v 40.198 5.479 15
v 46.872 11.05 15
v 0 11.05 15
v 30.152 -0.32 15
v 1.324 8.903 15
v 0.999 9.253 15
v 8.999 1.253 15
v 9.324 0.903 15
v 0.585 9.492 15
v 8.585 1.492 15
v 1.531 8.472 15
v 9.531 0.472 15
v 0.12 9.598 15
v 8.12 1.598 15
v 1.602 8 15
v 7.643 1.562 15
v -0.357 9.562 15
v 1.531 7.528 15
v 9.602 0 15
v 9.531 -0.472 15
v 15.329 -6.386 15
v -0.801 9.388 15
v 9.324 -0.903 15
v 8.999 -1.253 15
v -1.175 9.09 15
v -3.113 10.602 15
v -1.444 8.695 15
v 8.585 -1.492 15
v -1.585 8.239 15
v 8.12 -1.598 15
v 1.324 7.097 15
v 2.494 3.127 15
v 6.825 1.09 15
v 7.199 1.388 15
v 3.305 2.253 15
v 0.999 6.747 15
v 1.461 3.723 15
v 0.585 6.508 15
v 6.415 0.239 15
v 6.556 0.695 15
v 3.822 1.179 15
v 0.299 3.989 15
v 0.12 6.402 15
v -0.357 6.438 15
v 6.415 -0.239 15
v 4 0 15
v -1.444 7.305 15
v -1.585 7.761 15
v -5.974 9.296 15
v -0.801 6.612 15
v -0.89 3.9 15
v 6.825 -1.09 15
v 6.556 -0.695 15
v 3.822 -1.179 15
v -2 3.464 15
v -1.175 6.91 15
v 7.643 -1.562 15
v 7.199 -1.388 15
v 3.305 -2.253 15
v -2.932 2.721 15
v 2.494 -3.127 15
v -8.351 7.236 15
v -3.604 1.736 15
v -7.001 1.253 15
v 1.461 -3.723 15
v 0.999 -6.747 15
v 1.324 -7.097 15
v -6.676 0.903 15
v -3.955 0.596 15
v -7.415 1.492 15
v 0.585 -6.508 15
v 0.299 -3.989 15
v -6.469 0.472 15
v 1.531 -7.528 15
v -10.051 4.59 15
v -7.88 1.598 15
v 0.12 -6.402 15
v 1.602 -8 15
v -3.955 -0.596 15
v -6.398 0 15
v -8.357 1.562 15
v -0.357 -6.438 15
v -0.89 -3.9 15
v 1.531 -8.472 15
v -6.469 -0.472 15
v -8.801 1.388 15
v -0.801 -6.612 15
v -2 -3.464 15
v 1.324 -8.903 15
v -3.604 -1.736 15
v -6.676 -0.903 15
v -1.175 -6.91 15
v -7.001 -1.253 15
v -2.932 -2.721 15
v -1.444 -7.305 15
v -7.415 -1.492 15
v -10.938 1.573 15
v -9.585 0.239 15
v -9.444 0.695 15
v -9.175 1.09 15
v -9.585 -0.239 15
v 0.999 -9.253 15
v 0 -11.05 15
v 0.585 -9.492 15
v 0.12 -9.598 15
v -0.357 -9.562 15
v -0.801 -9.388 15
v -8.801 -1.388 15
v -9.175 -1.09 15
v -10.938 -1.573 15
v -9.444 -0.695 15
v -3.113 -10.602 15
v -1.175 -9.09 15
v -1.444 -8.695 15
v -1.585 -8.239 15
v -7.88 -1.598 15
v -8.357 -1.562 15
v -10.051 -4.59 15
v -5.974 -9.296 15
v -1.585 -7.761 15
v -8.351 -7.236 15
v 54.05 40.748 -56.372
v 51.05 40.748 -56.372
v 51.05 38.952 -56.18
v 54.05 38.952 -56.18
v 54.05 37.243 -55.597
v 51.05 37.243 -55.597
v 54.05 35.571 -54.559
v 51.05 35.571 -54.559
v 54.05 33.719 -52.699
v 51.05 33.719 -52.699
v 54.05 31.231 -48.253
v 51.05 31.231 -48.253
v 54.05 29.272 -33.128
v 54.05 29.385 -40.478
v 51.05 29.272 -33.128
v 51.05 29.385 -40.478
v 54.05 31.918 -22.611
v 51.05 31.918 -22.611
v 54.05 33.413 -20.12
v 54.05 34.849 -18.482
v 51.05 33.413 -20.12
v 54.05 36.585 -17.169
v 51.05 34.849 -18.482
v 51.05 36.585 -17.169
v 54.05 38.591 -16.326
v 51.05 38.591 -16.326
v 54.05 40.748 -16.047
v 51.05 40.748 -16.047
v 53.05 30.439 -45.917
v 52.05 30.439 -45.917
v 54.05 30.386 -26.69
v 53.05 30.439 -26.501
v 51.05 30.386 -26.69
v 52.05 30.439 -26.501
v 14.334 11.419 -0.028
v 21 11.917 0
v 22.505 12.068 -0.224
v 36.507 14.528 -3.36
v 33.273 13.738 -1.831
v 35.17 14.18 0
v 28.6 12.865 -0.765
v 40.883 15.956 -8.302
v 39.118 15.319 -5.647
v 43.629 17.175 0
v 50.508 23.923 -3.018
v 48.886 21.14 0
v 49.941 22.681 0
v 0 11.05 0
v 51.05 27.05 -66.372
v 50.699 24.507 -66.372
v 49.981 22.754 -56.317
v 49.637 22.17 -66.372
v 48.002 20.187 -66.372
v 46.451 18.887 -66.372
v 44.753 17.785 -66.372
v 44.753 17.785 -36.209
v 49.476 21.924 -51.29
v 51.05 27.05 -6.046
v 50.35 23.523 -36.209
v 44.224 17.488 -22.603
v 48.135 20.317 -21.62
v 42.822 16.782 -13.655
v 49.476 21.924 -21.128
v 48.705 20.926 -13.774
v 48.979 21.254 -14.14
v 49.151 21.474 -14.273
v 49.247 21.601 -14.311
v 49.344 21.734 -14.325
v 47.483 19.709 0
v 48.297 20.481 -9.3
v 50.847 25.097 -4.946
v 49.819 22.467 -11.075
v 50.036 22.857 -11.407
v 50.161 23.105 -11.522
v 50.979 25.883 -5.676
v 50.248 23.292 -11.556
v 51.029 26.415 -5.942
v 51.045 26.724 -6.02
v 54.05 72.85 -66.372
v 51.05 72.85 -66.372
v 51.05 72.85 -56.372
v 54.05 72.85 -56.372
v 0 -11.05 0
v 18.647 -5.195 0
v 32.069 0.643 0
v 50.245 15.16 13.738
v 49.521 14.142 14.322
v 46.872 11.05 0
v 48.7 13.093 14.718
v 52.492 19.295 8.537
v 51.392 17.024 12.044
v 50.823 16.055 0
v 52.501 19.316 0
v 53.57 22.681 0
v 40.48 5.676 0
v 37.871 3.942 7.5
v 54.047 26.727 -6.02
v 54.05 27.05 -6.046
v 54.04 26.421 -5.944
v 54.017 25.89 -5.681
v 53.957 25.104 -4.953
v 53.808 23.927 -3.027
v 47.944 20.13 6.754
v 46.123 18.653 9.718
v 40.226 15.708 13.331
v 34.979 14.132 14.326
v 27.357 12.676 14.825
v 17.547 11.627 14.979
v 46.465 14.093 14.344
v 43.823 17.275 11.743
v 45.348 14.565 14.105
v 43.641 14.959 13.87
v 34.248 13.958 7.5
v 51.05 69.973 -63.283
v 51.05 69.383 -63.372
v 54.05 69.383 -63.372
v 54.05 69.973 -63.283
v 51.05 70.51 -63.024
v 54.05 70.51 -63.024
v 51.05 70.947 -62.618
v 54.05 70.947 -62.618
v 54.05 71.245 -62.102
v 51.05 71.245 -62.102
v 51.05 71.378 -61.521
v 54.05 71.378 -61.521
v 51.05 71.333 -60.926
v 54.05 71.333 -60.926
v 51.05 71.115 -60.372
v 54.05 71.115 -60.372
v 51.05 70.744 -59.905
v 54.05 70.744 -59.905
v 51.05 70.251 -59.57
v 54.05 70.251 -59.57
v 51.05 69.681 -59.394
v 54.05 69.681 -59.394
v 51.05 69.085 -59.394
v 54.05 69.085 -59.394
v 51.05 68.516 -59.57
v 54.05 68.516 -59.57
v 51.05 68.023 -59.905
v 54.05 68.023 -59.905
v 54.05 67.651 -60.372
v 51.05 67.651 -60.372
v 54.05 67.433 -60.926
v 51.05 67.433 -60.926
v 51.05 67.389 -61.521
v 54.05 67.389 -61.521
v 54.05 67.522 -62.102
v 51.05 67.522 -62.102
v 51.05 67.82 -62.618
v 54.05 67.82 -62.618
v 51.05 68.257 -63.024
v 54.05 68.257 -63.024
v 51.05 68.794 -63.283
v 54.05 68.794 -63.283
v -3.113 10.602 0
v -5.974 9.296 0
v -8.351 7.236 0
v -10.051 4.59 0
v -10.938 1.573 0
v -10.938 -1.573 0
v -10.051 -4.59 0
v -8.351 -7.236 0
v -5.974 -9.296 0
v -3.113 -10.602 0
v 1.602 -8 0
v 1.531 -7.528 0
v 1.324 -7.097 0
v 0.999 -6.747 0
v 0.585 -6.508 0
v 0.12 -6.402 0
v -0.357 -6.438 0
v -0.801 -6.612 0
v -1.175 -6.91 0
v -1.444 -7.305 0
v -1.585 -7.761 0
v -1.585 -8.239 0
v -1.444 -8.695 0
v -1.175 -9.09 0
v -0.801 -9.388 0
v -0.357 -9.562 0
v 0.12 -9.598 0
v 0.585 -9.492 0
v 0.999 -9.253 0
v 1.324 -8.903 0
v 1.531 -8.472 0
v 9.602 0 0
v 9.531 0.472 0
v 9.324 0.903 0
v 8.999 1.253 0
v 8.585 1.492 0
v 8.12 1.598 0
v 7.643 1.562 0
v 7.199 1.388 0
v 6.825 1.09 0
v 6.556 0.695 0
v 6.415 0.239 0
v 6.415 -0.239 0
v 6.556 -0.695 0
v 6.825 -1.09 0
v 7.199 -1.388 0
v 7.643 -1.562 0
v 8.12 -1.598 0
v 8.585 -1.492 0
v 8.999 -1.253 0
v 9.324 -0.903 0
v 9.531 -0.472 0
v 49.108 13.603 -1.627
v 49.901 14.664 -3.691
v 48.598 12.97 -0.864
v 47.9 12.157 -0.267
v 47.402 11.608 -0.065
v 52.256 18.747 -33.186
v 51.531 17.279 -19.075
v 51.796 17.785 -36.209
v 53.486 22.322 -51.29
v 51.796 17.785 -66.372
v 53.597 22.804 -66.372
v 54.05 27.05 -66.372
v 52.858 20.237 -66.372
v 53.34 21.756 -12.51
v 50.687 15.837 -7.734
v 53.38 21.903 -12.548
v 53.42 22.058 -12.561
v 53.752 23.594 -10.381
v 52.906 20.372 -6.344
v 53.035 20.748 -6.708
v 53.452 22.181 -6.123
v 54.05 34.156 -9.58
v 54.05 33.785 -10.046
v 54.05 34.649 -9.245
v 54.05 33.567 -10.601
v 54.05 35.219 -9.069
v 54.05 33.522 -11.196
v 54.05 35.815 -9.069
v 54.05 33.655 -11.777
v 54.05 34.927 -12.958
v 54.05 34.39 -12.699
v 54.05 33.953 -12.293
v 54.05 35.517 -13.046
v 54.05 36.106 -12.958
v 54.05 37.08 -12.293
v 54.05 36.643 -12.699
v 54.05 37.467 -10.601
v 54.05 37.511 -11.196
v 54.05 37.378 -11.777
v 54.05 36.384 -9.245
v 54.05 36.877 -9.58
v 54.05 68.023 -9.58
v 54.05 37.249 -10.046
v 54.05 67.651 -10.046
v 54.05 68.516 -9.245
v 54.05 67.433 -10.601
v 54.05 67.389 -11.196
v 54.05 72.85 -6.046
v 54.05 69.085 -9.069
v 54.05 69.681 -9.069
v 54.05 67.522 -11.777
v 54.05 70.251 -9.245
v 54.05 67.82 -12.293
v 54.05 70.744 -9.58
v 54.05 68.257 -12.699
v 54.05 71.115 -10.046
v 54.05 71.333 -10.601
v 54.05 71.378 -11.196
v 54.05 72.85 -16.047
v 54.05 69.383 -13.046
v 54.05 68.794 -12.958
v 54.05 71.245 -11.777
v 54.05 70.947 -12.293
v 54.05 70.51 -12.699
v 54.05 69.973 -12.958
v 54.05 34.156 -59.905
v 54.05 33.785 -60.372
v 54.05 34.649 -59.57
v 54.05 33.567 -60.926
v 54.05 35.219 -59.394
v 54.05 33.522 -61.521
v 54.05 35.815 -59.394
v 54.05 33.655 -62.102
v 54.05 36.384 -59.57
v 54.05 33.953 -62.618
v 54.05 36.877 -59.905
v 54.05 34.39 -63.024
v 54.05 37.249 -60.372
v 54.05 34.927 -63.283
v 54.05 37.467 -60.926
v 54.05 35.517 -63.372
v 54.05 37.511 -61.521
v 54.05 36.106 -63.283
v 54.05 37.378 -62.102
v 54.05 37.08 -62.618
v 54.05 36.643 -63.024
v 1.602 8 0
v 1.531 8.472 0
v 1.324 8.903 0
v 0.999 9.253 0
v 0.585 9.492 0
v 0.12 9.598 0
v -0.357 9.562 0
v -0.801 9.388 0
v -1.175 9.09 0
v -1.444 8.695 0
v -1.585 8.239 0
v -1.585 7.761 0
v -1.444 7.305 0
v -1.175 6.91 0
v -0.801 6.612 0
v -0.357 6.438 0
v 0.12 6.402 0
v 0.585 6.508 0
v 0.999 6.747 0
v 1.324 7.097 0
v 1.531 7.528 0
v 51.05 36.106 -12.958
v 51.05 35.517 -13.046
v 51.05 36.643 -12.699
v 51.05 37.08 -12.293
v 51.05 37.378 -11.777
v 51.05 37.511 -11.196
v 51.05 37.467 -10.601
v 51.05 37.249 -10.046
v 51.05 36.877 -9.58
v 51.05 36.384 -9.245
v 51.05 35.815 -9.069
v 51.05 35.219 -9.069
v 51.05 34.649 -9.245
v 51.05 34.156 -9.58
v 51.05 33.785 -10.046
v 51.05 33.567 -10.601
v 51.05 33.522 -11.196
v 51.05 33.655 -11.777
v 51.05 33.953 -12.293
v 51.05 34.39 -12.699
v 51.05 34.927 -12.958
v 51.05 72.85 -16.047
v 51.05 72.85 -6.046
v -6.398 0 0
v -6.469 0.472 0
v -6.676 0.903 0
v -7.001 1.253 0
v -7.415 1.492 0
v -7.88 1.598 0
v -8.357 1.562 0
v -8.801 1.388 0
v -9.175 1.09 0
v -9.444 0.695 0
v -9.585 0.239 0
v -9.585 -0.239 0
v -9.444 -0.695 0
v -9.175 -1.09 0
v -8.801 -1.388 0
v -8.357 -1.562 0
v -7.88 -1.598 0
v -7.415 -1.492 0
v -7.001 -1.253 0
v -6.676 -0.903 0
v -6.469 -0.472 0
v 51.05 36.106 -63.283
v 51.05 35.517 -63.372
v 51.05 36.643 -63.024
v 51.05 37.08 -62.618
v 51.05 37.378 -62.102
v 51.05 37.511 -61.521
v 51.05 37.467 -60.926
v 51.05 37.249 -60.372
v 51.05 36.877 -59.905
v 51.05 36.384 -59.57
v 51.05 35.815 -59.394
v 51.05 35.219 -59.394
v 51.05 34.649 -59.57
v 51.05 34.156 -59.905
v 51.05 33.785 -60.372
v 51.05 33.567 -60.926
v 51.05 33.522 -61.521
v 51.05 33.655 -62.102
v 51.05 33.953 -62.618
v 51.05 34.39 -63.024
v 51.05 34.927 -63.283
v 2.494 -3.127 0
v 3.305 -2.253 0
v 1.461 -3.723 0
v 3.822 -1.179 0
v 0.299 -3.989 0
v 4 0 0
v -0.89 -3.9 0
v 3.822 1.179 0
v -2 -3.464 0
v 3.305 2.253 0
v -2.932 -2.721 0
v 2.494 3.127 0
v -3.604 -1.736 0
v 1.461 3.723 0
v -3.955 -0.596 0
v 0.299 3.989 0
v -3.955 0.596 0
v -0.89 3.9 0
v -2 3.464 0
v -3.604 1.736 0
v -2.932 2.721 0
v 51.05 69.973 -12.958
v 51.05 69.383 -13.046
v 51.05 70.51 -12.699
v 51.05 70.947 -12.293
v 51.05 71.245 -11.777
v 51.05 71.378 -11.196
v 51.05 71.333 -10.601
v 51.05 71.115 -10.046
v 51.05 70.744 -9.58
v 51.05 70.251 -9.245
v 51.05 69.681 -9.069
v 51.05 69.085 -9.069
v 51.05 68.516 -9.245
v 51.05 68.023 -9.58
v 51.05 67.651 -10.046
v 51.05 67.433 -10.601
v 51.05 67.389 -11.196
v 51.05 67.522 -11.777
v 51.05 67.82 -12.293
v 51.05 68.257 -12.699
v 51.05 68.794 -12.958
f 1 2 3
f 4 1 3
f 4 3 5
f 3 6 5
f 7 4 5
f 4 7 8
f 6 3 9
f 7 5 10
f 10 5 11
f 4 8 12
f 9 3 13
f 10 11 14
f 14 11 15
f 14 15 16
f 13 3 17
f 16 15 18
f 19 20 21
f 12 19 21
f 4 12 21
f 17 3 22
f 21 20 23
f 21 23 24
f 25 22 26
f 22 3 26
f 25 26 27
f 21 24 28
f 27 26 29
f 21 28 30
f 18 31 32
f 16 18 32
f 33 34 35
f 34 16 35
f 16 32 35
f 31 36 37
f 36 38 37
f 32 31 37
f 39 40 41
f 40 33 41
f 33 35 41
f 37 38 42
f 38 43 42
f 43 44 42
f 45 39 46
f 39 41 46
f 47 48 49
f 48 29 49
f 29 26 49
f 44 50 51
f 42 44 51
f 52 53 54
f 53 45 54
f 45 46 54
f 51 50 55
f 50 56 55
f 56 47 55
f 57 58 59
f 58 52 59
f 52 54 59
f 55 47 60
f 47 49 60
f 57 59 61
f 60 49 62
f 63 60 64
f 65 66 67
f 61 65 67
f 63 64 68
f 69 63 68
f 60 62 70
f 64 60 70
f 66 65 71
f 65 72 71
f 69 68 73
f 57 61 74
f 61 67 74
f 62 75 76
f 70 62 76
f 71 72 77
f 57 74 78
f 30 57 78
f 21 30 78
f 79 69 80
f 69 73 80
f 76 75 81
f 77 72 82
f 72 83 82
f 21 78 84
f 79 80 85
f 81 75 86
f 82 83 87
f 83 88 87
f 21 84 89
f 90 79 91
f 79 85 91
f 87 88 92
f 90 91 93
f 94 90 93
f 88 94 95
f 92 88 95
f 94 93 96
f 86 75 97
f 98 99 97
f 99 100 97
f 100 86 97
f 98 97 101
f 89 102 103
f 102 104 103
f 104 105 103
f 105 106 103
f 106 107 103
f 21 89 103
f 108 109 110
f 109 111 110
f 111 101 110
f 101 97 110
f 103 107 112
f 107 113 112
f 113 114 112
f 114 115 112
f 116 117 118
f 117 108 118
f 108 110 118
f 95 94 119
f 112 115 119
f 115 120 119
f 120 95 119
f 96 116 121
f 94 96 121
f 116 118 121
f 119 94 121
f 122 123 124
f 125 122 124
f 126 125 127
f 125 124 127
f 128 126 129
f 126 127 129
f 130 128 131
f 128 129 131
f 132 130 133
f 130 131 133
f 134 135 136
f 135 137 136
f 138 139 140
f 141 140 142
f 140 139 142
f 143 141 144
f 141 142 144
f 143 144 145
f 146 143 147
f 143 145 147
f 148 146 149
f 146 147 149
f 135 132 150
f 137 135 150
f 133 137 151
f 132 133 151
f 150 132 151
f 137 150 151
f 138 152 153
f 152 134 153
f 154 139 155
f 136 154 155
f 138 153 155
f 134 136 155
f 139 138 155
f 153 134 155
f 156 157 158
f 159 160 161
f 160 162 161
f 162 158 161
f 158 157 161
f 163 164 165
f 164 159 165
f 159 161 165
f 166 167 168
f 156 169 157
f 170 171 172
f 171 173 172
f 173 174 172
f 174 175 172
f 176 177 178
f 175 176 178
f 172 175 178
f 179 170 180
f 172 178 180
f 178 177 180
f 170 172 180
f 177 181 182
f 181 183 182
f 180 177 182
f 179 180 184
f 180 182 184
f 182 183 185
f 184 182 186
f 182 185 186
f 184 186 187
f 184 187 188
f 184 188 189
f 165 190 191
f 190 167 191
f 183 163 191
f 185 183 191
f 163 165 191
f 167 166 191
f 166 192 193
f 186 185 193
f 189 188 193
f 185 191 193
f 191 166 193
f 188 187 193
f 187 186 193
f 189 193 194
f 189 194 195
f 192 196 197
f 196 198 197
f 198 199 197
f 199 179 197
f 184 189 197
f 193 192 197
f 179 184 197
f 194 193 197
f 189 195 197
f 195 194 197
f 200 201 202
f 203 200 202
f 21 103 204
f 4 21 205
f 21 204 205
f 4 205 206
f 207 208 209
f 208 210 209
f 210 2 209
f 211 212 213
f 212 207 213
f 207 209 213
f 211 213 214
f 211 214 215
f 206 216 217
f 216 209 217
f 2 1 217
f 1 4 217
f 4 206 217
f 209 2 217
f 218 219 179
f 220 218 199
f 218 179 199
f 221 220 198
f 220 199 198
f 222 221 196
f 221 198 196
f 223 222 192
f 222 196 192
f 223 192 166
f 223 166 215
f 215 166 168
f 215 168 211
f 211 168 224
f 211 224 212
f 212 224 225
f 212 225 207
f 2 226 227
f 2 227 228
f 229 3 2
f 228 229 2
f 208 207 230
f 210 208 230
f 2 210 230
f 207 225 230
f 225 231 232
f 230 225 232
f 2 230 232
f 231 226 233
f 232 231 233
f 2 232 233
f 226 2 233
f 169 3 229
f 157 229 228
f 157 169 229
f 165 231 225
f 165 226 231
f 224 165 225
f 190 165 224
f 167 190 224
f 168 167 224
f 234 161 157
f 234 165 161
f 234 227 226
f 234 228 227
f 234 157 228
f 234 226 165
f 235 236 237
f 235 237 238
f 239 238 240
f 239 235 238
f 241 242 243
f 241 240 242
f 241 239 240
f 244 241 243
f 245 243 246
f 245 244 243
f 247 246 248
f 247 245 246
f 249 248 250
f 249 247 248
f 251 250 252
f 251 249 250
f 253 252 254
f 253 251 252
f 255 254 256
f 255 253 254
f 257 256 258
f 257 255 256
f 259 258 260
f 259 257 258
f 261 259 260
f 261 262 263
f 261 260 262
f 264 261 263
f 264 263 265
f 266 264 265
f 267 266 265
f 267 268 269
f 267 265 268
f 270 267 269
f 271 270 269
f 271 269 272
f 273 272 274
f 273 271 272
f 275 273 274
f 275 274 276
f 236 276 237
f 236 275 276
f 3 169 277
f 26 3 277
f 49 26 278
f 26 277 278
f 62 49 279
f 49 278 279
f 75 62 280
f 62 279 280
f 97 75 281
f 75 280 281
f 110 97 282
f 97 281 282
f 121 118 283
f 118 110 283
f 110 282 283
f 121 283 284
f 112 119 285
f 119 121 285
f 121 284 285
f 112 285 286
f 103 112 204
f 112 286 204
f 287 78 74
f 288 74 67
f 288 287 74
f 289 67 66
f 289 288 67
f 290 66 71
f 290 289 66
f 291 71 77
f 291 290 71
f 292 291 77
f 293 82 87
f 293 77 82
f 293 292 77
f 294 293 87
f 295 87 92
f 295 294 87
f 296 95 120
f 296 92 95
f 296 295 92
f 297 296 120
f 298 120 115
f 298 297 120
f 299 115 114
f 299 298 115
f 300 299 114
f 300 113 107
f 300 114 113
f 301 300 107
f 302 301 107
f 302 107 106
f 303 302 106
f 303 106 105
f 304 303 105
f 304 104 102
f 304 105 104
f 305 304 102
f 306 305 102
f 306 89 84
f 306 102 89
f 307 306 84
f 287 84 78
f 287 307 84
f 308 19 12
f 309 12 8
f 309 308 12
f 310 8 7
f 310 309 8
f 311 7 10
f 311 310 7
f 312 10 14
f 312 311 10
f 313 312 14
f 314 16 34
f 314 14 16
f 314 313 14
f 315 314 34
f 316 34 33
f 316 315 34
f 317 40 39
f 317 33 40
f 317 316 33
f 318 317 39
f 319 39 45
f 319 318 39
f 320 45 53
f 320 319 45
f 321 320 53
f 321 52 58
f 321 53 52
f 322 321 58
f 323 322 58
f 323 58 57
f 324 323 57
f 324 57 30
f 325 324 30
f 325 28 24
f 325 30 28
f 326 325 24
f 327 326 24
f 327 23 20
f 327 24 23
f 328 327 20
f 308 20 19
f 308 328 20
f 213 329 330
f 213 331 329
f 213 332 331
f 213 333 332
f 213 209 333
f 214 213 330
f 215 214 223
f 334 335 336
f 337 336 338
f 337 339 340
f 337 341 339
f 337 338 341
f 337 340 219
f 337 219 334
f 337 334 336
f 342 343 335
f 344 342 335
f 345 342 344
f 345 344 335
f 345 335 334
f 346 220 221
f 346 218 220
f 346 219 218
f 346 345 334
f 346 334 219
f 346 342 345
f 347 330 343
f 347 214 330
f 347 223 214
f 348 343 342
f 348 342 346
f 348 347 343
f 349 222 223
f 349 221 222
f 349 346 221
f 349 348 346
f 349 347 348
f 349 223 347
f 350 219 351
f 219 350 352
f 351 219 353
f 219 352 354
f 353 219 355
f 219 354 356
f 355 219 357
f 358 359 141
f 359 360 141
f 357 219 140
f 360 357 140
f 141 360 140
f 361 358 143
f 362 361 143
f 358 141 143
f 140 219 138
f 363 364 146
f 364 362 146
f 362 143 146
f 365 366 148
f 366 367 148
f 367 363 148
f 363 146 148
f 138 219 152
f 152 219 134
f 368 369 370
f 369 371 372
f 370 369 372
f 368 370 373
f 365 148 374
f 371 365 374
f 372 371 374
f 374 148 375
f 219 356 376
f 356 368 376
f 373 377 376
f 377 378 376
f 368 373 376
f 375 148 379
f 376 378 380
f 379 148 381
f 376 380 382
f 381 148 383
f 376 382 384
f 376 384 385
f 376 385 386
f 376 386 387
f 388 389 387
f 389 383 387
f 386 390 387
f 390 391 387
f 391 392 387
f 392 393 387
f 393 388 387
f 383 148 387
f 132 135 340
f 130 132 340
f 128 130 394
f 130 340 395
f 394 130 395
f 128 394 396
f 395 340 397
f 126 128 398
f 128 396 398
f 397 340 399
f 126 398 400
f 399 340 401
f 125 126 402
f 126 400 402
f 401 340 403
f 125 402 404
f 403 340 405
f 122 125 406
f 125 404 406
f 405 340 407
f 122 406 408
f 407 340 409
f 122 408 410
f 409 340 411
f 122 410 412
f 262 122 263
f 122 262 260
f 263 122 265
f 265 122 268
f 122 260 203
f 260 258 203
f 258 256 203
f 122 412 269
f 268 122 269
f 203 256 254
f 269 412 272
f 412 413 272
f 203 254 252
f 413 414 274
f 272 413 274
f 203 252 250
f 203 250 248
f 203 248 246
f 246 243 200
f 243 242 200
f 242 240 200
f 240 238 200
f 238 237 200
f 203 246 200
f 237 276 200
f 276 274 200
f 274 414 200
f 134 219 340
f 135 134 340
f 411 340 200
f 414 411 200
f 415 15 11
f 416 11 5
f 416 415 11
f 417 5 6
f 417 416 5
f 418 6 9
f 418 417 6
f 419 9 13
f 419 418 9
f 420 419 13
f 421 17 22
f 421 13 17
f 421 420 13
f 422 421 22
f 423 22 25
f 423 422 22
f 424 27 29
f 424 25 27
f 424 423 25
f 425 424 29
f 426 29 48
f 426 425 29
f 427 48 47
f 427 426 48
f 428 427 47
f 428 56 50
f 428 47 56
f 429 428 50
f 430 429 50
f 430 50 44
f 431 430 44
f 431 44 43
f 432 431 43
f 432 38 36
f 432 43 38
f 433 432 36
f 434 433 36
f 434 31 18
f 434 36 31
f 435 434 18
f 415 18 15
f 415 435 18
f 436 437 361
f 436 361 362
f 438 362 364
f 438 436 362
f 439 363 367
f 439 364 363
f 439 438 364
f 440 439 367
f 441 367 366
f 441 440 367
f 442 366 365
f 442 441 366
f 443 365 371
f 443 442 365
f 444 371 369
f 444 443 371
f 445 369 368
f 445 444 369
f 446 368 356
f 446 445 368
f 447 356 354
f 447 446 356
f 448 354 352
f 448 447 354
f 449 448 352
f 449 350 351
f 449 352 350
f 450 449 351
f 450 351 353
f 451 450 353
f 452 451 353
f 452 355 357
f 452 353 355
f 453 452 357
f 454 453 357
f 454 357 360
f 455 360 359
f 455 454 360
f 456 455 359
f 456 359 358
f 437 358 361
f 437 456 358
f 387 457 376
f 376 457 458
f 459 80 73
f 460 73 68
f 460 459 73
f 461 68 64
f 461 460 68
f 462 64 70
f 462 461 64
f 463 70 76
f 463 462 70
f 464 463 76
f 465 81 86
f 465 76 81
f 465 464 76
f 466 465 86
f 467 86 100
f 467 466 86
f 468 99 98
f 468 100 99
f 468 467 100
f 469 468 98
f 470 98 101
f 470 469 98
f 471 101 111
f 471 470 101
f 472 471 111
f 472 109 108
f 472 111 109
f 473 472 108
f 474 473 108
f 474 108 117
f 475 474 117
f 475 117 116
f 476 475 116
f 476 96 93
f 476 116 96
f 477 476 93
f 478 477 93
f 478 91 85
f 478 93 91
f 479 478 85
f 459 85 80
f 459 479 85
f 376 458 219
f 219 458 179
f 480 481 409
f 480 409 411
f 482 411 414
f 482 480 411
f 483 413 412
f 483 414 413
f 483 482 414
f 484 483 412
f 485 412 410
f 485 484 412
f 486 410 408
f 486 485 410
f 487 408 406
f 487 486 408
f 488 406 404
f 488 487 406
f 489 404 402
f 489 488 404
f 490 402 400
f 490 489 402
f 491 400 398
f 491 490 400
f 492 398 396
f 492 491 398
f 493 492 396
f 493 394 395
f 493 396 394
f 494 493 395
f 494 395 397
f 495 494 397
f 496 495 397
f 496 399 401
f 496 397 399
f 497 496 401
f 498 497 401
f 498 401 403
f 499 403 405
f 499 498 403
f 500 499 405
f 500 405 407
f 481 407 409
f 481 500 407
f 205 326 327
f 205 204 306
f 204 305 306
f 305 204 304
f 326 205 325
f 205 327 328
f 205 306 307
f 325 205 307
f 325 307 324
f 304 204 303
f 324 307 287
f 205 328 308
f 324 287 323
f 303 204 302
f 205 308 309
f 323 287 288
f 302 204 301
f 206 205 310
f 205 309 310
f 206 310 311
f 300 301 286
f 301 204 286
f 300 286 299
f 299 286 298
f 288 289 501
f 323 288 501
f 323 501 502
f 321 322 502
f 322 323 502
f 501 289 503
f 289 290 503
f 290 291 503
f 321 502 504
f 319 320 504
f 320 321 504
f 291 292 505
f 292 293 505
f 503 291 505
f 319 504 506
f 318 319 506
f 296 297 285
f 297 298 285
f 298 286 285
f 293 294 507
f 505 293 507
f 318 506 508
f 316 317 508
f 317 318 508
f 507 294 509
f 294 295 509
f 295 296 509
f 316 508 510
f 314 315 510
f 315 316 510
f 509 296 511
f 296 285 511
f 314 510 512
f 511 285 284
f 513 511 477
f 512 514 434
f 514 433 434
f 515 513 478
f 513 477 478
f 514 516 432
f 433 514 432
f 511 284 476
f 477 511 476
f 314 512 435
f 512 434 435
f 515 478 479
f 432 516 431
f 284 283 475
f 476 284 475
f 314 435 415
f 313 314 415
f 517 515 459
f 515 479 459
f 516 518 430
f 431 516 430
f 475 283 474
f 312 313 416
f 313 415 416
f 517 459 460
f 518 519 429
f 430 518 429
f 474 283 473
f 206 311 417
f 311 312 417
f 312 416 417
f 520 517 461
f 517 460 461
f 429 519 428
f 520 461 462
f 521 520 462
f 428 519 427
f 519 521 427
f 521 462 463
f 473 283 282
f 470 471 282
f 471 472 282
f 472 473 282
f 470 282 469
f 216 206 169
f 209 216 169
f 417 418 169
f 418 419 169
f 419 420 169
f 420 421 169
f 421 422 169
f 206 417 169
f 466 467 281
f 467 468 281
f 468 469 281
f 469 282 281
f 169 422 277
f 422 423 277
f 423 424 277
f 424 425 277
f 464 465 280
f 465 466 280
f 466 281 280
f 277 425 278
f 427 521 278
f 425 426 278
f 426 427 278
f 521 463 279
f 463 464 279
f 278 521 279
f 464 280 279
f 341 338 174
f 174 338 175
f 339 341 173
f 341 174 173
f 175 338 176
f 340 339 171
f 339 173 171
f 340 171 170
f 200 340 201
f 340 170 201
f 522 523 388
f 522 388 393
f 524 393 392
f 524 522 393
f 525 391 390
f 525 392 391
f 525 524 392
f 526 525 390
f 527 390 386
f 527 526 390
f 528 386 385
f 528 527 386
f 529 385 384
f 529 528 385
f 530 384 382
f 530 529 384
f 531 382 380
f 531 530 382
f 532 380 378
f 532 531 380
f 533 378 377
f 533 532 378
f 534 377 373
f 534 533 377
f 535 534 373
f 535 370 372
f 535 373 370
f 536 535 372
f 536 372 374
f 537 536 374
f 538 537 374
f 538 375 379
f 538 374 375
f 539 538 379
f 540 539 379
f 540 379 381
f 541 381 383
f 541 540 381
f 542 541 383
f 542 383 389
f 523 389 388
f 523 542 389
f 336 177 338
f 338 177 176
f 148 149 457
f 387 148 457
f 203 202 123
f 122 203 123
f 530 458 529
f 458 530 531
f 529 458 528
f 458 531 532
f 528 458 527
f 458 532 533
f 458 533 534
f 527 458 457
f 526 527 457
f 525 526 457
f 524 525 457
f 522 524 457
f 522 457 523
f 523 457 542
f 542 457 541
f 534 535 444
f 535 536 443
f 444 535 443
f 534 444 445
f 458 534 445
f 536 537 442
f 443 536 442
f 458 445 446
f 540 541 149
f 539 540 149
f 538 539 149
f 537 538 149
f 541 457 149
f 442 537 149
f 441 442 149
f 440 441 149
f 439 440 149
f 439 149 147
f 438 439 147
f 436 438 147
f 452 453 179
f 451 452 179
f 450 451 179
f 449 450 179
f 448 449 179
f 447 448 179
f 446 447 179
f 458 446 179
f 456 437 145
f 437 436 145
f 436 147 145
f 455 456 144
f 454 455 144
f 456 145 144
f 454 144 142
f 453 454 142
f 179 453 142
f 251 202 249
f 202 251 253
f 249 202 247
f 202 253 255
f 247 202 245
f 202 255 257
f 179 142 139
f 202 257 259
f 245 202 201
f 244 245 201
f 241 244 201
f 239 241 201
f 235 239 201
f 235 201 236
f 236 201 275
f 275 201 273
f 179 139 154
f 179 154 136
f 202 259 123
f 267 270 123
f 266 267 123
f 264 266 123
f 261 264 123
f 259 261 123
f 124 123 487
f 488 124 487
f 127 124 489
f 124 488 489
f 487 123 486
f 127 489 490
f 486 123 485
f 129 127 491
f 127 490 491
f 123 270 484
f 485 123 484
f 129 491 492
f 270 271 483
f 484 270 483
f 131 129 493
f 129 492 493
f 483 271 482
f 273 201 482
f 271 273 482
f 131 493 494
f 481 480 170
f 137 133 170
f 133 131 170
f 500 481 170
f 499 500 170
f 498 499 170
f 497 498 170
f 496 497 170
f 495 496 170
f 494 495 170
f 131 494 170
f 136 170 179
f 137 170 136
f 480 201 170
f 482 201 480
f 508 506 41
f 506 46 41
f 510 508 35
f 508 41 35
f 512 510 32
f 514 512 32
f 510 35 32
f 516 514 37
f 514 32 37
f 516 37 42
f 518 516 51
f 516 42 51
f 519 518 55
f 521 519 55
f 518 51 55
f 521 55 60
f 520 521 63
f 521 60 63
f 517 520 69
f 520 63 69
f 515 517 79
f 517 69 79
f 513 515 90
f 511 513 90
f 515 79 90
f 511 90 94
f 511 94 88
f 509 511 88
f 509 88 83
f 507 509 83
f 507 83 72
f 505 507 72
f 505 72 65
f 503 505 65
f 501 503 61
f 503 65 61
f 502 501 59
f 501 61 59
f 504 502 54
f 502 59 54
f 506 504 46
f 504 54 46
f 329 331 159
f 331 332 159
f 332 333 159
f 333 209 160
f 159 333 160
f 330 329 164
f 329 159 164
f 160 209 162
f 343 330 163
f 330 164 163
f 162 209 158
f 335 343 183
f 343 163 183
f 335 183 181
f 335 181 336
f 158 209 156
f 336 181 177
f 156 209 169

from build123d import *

# Parameters (mm, degrees)
BOSS_EXTRUDE1_START     = -60.5
BOSS_EXTRUDE1_OUTLINE_R = 2
BOSS_EXTRUDE1_DEPTH     = 121
SKETCH1_W               = 179.187175662
SKETCH1_H               = 206.234296517
SKETCH1_R               = 1.6025
SKETCH1_R_2             = 4
CUT_EXTRUDE1_DEPTH      = 80


# Read off the part's stored shape, not the designer's step: Boss-Extrude1
with BuildPart() as part:
    # Boss-Extrude1 outline → Boss-Extrude1 (new body)
    with BuildSketch(Plane(origin=(0, 0, 0), x_dir=(0, 0, -1), z_dir=(1, 0, 0)).offset(BOSS_EXTRUDE1_START)):
        with BuildLine():
            Line((6.0465, 72.85), (6.0465, 27.05))
            add(Edge.make_bspline(
                [(6.0465, 27.05), (6.0465, 21.716666667), (-15, 21.716666667), (-15, 11.05)],
                knots=[0, 0, 0, 0, 1, 1, 1, 1], degree=3))
            Line((-15, 11.05), (-15, -11.05))
            Line((-15, -11.05), (0, -11.05))
            Line((0, -11.05), (0, 11.05))
            add(Edge.make_bspline(
                [(0, 11.05), (0, 17.784890874), (36.209, 17.784890874)],
                knots=[0, 0, 0, 1, 1, 1], degree=2))
            Line((36.209, 17.784890874), (66.3715, 17.784890874))
            Line((66.3715, 17.784890874), (66.3715, 72.85))
            Line((66.3715, 72.85), (56.3715, 72.85))
            Line((56.3715, 72.85), (56.3715, 40.748146134))
            add(Edge.make_bspline(
                [(56.3715, 40.748146134), (56.3715, 25.284890874), (16.0465, 25.284890874), (16.0465, 40.748146134)],
                knots=[0, 0, 0, 0, 1, 1, 1, 1], degree=3))
            Line((16.0465, 40.748146134), (16.0465, 72.85))
            Line((16.0465, 72.85), (6.0465, 72.85))
        make_face()
        with Locations((11.0465, 35.516666667)):
            Circle(BOSS_EXTRUDE1_OUTLINE_R, mode=Mode.SUBTRACT)
        with Locations((11.0465, 69.383333333)):
            Circle(BOSS_EXTRUDE1_OUTLINE_R, mode=Mode.SUBTRACT)
        with Locations((61.3715, 35.516666667)):
            Circle(BOSS_EXTRUDE1_OUTLINE_R, mode=Mode.SUBTRACT)
        with Locations((61.3715, 69.383333333)):
            Circle(BOSS_EXTRUDE1_OUTLINE_R, mode=Mode.SUBTRACT)
    extrude(amount=BOSS_EXTRUDE1_DEPTH)

    # Sketch1 → Cut-Extrude1 (cut, symmetric)
    # profile 1 of 6: a face of its own
    with BuildSketch(Plane.XY):
        with Locations((-22.097828966, 29.224383364)):
            Rectangle(SKETCH1_W, SKETCH1_H)
        with BuildLine():
            add(Edge.make_bspline(
                [(0, -11.05), (54.05, 3.432653851), (54.05, 27.05)],
                knots=[0, 0, 0, 1, 1, 1], degree=2))
            Line((54.05, 27.05), (54.05, 72.85))
            Line((54.05, 72.85), (51.05, 72.85))
            Line((51.05, 72.85), (51.05, 27.05))
            add(Edge.make_bspline(
                [(0, 11.05), (51.05, 11.05), (51.05, 27.05)],
                knots=[0, 0, 0, 1, 1, 1], degree=2))
            ThreePointArc((0, 11.05), (-11.05, 0), (0, -11.05))
        make_face(mode=Mode.SUBTRACT)
    # profile 2 of 6: a face of its own
    with BuildSketch(Plane.XY):
        with Locations((8, 0)):
            Circle(SKETCH1_R)
    # profile 3 of 6: a face of its own
    with BuildSketch(Plane.XY):
        with Locations((0, 8)):
            Circle(SKETCH1_R)
    # profile 4 of 6: a face of its own
    with BuildSketch(Plane.XY):
        with Locations((-8, 0)):
            Circle(SKETCH1_R)
    # profile 5 of 6: a face of its own
    with BuildSketch(Plane.XY):
        with Locations((0, -8)):
            Circle(SKETCH1_R)
    # profile 6 of 6: a face of its own
    with BuildSketch(Plane.XY):
        Circle(SKETCH1_R_2)
    extrude(amount=CUT_EXTRUDE1_DEPTH, both=True, mode=Mode.SUBTRACT)


solid = part.part
